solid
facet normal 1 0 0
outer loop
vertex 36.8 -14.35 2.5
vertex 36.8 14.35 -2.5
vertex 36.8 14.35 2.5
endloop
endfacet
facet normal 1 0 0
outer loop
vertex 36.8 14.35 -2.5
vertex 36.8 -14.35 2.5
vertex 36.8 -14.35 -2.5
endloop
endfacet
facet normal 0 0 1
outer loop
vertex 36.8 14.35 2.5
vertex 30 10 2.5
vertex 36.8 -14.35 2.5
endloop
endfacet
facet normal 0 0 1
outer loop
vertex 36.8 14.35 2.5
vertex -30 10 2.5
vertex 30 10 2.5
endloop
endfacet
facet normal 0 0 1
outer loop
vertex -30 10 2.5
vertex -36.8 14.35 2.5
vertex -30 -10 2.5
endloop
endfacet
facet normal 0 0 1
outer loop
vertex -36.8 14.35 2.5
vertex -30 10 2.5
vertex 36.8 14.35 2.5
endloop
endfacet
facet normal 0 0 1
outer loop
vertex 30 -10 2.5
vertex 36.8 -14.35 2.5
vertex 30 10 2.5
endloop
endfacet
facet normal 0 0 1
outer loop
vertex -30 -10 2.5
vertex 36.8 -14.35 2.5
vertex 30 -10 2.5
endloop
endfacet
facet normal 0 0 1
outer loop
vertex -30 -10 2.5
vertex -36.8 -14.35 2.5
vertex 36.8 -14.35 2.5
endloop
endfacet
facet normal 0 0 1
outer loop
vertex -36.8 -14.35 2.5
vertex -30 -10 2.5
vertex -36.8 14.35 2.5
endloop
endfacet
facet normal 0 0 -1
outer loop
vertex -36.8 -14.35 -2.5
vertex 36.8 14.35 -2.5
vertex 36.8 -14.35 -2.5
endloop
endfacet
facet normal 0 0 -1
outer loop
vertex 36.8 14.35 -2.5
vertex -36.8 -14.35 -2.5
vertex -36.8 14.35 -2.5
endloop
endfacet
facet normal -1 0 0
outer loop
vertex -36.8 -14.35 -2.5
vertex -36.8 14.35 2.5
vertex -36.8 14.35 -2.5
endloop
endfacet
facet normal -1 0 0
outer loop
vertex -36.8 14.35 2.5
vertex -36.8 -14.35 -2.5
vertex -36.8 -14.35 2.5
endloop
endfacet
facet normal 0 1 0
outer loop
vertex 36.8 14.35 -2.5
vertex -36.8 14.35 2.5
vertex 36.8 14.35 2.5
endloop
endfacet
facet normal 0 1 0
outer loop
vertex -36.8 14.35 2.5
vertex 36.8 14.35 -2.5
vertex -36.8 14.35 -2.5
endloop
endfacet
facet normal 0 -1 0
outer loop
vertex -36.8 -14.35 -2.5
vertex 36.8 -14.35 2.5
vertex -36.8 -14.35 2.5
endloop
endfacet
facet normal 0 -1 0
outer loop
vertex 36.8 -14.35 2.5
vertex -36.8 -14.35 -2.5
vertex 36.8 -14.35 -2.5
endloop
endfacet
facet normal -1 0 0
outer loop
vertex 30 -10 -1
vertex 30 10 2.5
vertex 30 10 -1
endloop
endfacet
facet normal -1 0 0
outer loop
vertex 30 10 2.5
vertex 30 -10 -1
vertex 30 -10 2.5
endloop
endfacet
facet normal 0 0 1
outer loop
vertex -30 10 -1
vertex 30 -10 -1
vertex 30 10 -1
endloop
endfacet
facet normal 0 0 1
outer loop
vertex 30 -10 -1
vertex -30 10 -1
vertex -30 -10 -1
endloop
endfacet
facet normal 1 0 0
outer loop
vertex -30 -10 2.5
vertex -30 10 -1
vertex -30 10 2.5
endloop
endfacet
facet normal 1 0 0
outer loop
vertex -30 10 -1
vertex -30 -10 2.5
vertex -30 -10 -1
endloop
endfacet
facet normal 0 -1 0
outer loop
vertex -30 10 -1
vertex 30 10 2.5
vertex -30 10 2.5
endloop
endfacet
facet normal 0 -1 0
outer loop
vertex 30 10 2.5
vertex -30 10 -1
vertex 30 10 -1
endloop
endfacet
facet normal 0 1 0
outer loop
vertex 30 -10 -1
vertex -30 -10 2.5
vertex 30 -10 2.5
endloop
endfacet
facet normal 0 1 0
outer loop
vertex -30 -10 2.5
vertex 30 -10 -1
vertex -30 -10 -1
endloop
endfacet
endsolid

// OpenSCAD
module display_module() {
    difference() {
        // Main body of the display
        cube([73.6, 28.7, 5], center=true);
        
        // Cutout for the screen area
        translate([-30, -10, -1])
            cube([60, 20, 6], center=false);
    }
}

display_module();
